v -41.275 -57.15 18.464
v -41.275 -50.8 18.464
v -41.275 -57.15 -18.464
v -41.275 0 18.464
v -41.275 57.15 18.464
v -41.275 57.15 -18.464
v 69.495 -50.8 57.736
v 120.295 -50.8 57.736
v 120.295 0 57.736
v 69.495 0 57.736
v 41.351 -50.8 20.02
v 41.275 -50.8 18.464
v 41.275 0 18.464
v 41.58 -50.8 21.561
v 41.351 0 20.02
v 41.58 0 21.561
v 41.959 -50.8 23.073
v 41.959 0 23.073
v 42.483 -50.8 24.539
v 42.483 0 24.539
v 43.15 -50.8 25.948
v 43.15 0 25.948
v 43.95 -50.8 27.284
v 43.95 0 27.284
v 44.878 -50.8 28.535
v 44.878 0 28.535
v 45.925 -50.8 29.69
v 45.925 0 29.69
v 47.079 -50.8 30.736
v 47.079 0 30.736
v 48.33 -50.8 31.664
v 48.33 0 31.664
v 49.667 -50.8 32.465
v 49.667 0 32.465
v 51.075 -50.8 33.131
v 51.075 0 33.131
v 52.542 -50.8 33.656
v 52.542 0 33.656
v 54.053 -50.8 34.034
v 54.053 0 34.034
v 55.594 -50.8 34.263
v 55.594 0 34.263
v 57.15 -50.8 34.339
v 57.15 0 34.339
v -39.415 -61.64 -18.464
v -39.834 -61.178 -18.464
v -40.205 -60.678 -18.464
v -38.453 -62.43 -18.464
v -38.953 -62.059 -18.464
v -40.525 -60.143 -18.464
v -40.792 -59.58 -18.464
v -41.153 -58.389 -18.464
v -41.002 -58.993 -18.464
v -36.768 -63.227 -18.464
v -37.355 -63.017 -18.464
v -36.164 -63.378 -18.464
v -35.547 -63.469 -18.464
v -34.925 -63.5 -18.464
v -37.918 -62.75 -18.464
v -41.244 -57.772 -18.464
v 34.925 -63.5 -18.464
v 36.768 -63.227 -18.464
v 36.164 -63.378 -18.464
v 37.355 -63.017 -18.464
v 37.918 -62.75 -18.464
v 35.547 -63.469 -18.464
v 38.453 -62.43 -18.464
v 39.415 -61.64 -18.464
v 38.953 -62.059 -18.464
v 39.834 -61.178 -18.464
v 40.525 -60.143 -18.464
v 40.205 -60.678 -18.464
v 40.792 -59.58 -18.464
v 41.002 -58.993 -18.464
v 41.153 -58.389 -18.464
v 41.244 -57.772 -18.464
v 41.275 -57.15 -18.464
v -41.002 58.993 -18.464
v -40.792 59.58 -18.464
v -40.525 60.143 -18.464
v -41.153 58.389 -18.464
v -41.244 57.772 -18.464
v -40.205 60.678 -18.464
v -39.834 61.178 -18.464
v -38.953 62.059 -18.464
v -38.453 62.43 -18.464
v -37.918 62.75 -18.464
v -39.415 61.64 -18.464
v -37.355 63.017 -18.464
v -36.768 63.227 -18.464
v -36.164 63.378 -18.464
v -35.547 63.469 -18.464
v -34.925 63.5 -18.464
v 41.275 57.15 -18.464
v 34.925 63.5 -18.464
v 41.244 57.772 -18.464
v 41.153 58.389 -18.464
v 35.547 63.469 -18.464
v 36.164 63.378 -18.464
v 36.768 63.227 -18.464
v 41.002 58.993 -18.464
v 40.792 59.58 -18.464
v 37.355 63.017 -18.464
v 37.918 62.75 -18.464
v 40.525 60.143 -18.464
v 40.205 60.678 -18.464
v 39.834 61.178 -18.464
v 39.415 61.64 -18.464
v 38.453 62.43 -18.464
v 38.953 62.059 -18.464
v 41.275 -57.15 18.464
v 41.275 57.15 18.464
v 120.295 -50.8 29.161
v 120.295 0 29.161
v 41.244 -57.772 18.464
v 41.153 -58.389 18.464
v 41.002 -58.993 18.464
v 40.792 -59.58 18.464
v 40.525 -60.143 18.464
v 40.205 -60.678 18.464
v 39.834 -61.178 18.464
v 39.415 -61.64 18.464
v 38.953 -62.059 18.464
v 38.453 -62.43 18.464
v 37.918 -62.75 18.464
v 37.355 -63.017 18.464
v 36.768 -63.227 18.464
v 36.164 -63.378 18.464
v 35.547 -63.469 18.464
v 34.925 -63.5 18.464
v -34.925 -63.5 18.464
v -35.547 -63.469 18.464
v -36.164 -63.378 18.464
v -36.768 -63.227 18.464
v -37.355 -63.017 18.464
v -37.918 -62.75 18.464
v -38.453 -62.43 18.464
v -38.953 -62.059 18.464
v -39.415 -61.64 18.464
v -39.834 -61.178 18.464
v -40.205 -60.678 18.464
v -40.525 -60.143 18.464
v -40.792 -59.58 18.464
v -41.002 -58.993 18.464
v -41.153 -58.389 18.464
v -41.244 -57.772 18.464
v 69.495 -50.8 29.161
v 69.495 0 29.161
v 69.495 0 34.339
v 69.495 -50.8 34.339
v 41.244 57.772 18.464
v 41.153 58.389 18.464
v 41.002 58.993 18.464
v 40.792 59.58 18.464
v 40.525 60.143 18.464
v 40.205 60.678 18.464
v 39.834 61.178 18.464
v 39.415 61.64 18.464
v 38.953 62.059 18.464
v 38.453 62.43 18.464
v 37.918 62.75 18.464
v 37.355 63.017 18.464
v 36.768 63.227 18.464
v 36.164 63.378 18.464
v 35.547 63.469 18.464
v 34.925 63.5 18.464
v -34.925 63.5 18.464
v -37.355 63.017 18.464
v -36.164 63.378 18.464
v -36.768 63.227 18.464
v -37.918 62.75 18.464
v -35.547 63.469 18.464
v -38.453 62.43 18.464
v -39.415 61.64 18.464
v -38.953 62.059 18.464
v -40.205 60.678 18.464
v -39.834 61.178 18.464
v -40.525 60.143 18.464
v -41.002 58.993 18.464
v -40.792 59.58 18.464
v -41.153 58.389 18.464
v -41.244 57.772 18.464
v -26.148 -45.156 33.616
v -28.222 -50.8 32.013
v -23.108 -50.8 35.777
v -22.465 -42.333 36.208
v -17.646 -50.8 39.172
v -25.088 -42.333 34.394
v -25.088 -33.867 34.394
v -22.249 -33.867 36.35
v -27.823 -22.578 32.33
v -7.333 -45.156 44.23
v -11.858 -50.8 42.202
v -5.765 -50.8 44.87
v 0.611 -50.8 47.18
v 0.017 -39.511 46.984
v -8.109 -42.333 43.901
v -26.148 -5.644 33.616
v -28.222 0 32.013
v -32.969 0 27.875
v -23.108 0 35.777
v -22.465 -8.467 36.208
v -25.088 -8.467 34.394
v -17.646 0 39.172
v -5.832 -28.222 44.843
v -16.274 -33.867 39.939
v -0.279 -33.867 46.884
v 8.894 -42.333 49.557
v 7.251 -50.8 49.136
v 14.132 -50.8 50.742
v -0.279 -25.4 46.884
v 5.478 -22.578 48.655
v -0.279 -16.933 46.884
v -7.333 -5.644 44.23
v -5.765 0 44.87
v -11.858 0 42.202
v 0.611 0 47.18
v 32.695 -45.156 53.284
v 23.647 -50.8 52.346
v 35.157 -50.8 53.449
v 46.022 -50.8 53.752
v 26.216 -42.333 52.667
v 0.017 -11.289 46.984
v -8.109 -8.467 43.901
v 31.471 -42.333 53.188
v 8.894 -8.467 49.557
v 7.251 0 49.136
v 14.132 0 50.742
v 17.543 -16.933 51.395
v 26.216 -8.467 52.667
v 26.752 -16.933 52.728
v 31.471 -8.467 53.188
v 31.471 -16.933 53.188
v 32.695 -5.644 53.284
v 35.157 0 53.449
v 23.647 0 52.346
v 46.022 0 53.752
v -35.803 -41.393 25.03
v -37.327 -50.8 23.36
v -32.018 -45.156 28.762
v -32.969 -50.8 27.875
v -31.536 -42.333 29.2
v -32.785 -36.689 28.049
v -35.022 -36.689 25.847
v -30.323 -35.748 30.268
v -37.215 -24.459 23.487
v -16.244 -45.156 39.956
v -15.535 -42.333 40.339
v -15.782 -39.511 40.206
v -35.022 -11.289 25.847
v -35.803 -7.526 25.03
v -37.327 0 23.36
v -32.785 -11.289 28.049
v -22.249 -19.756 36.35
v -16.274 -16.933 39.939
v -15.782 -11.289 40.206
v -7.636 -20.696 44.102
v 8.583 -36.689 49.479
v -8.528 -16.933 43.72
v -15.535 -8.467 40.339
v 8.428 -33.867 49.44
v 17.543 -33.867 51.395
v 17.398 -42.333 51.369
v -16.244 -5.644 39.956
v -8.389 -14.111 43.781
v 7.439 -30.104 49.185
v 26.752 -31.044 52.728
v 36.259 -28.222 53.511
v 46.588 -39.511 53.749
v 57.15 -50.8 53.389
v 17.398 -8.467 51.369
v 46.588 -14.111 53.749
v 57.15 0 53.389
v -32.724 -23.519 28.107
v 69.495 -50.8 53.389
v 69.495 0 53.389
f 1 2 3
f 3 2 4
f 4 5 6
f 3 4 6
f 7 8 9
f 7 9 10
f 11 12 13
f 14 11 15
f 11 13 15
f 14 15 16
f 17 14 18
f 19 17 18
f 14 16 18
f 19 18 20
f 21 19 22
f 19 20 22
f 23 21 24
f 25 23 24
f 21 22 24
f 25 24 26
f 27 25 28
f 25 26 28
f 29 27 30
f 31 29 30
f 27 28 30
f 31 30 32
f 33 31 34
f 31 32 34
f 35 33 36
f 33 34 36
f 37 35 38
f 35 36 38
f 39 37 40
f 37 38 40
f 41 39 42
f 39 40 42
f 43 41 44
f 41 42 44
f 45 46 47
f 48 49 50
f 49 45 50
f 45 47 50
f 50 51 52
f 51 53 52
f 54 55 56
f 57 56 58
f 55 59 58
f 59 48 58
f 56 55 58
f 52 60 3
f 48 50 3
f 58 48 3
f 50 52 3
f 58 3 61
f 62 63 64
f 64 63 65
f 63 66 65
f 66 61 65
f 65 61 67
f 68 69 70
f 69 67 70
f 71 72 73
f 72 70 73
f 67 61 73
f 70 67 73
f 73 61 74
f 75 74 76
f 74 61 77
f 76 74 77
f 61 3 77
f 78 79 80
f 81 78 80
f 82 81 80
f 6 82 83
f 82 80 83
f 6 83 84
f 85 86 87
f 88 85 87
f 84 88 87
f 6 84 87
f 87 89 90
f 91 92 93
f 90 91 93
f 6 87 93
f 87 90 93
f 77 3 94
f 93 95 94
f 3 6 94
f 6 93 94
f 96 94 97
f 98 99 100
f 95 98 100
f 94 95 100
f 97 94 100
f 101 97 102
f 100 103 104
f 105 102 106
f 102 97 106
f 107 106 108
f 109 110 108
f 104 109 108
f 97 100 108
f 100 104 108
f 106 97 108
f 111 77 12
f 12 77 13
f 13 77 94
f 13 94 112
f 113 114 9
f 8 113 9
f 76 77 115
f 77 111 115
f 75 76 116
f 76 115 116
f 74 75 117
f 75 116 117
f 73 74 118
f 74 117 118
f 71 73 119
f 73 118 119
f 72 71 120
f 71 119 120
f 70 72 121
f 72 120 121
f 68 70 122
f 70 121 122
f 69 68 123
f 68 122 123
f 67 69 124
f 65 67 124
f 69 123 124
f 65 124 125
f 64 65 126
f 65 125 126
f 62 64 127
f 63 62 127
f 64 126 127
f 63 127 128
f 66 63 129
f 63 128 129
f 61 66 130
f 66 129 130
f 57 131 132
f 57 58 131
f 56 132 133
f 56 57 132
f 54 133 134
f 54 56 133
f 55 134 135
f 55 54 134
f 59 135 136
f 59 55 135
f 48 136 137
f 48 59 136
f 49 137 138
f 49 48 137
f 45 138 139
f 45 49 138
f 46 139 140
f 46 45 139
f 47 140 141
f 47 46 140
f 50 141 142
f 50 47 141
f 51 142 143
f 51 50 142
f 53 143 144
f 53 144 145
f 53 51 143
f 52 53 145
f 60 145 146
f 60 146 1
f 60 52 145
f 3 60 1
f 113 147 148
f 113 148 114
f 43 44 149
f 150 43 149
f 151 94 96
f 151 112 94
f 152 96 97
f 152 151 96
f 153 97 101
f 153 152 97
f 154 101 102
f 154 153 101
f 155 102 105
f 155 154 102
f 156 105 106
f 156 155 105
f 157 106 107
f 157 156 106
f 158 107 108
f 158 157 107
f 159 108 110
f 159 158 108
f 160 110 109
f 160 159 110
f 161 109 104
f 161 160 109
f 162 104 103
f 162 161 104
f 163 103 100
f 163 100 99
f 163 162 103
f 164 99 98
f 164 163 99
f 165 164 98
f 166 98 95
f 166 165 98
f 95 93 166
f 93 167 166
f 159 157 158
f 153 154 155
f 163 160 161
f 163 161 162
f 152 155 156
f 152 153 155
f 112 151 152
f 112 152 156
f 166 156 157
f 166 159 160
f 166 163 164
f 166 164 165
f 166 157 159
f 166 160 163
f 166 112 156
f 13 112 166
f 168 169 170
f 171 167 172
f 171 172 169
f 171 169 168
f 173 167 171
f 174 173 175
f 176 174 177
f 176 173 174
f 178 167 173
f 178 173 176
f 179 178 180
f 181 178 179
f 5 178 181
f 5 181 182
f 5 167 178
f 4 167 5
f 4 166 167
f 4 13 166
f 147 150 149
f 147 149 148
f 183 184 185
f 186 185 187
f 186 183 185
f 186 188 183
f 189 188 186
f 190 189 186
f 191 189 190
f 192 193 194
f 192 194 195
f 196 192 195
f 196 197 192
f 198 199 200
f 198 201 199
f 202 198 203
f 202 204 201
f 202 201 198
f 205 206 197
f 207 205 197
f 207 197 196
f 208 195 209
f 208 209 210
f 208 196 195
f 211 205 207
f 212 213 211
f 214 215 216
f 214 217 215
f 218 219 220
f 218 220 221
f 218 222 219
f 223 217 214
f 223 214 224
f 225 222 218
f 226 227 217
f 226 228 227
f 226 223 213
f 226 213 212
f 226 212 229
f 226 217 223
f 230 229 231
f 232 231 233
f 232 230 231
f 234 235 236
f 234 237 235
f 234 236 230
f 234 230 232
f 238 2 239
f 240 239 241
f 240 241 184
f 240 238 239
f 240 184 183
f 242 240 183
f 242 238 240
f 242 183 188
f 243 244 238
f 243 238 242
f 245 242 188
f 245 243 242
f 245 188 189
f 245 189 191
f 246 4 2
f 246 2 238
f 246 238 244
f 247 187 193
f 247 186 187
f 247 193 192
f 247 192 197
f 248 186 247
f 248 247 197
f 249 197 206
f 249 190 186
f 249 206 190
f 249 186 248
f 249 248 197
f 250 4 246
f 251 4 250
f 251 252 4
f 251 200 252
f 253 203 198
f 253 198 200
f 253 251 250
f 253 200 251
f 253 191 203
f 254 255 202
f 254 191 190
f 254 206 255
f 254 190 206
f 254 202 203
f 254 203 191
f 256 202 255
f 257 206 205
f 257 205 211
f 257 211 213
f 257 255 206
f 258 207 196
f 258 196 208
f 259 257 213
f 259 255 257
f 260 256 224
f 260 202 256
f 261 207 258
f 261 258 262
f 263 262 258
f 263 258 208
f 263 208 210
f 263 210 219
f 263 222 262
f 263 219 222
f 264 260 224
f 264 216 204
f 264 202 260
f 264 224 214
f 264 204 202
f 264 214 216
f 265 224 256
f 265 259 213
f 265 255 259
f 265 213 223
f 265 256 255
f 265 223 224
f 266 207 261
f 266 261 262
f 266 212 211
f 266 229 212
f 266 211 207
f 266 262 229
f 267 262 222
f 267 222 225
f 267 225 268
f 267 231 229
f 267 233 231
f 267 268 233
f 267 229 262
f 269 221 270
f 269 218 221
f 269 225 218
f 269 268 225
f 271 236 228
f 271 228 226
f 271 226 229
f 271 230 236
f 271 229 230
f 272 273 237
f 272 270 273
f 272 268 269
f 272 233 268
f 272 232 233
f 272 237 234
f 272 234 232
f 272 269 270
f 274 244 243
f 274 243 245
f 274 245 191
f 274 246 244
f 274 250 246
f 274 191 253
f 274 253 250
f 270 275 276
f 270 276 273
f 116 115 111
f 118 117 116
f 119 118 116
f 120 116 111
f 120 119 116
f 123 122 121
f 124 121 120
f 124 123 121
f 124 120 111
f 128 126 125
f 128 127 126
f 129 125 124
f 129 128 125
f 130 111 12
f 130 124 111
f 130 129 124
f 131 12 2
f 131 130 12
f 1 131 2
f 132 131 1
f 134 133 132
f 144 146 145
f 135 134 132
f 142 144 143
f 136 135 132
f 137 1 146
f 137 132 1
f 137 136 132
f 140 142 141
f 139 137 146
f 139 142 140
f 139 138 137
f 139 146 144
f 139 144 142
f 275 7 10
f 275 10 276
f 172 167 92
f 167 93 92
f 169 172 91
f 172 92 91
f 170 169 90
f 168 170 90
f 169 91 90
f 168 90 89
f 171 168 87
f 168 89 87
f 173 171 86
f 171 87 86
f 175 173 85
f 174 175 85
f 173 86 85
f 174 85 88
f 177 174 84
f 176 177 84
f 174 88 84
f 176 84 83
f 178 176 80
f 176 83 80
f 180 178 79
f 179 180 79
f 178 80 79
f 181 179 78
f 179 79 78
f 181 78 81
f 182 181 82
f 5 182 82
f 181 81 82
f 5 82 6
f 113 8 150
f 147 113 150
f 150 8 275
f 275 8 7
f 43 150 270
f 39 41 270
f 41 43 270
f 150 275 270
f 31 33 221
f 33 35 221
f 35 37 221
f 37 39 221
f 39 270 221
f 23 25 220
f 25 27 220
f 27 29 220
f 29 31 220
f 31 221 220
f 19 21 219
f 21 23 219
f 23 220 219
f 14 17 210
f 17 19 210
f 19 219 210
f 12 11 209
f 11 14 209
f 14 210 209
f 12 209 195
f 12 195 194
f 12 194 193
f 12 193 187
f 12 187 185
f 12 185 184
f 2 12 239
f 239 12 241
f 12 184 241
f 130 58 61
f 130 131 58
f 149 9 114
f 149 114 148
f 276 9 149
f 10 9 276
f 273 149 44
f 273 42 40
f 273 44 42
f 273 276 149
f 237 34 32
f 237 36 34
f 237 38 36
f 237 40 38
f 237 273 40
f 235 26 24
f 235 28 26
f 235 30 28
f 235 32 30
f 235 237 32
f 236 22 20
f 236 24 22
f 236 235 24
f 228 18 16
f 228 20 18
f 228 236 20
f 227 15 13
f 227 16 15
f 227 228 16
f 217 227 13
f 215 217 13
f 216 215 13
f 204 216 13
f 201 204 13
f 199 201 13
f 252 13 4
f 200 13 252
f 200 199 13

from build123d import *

# Parameters (mm, degrees)
F1_DEPTH = 63.5
F2_DEPTH = 50.8
F3_DEPTH = 15.875
F4_R     = 6.35


with BuildPart() as f1:
    # F0 (on Front) → F1 (new body, symmetric)
    with BuildSketch(Plane.XZ):
        Polygon((22.225, 18.464241), (-41.275, 18.464241), (-41.275, -18.464241), (41.275, -18.464241), (41.275, 18.464241), align=None)
    extrude(amount=F1_DEPTH, both=True)

    # F0 (on Front) → F2 (join)
    with BuildSketch(Plane.XZ):
        with BuildLine():
            add(Edge.make_bspline(
                [(-41.275, 18.464241), (-21.691592, 45.134176), (15.657064, 55.939447), (57.15, 53.389241)],
                knots=[0, 0, 0, 0, 104.437715, 104.437715, 104.437715, 104.437715], degree=3))
            Line((-41.275, 18.464241), (22.225, 18.464241))
            ThreePointArc((22.225, 18.464241), (32.454296, 43.159945), (57.15, 53.389241))
        make_face()
        Polygon((22.225, 18.464241), (-41.275, 18.464241), (-41.275, -18.464241), (41.275, -18.464241), (41.275, 18.464241), align=None)
        with BuildLine():
            ThreePointArc((57.15, 53.389241), (32.454296, 43.159945), (22.225, 18.464241))
            Line((22.225, 18.464241), (41.275, 18.464241))
            ThreePointArc((41.275, 18.464241), (45.92468, 29.689561), (57.15, 34.339241))
            Line((57.15, 34.339241), (69.494901, 34.339241))
            Line((69.494901, 34.339241), (69.494901, 53.000192))
            Line((69.494901, 53.000192), (69.494901, 53.389241))
            Line((69.494901, 53.389241), (57.15, 53.389241))
        make_face()
        Polygon((69.494901, 57.735759), (69.494901, 53.389241), (69.494901, 53.000192), (69.494901, 34.339241), (69.494901, 29.160759), (120.294901, 29.160759), (120.294901, 57.735759), align=None)
    extrude(amount=F2_DEPTH)

    # F0 (on Front) → F3 (join)
    with BuildSketch(Plane.XZ):
        with BuildLine():
            add(Edge.make_bspline(
                [(-41.275, 18.464241), (-21.691592, 45.134176), (15.657064, 55.939447), (57.15, 53.389241)],
                knots=[0, 0, 0, 0, 104.437715, 104.437715, 104.437715, 104.437715], degree=3))
            Line((-41.275, 18.464241), (22.225, 18.464241))
            ThreePointArc((22.225, 18.464241), (32.454296, 43.159945), (57.15, 53.389241))
        make_face()
        Polygon((22.225, 18.464241), (-41.275, 18.464241), (-41.275, -18.464241), (41.275, -18.464241), (41.275, 18.464241), align=None)
        with BuildLine():
            ThreePointArc((57.15, 53.389241), (32.454296, 43.159945), (22.225, 18.464241))
            Line((22.225, 18.464241), (41.275, 18.464241))
            ThreePointArc((41.275, 18.464241), (45.92468, 29.689561), (57.15, 34.339241))
            Line((57.15, 34.339241), (69.494901, 34.339241))
            Line((69.494901, 34.339241), (69.494901, 53.000192))
            Line((69.494901, 53.000192), (69.494901, 53.389241))
            Line((69.494901, 53.389241), (57.15, 53.389241))
        make_face()
        Polygon((69.494901, 57.735759), (69.494901, 53.389241), (69.494901, 53.000192), (69.494901, 34.339241), (69.494901, 29.160759), (120.294901, 29.160759), (120.294901, 57.735759), align=None)
    extrude(amount=F3_DEPTH)

    # F4
    f4_edges = [f1.edges().sort_by_distance(p)[0] for p in [
        (41.275, -63.5, 0),
        (-41.275, -63.5, 0),
        (41.275, 63.5, 0),
        (-41.275, 63.5, 0),
    ]]
    fillet(f4_edges, radius=F4_R)


solid = f1.part
